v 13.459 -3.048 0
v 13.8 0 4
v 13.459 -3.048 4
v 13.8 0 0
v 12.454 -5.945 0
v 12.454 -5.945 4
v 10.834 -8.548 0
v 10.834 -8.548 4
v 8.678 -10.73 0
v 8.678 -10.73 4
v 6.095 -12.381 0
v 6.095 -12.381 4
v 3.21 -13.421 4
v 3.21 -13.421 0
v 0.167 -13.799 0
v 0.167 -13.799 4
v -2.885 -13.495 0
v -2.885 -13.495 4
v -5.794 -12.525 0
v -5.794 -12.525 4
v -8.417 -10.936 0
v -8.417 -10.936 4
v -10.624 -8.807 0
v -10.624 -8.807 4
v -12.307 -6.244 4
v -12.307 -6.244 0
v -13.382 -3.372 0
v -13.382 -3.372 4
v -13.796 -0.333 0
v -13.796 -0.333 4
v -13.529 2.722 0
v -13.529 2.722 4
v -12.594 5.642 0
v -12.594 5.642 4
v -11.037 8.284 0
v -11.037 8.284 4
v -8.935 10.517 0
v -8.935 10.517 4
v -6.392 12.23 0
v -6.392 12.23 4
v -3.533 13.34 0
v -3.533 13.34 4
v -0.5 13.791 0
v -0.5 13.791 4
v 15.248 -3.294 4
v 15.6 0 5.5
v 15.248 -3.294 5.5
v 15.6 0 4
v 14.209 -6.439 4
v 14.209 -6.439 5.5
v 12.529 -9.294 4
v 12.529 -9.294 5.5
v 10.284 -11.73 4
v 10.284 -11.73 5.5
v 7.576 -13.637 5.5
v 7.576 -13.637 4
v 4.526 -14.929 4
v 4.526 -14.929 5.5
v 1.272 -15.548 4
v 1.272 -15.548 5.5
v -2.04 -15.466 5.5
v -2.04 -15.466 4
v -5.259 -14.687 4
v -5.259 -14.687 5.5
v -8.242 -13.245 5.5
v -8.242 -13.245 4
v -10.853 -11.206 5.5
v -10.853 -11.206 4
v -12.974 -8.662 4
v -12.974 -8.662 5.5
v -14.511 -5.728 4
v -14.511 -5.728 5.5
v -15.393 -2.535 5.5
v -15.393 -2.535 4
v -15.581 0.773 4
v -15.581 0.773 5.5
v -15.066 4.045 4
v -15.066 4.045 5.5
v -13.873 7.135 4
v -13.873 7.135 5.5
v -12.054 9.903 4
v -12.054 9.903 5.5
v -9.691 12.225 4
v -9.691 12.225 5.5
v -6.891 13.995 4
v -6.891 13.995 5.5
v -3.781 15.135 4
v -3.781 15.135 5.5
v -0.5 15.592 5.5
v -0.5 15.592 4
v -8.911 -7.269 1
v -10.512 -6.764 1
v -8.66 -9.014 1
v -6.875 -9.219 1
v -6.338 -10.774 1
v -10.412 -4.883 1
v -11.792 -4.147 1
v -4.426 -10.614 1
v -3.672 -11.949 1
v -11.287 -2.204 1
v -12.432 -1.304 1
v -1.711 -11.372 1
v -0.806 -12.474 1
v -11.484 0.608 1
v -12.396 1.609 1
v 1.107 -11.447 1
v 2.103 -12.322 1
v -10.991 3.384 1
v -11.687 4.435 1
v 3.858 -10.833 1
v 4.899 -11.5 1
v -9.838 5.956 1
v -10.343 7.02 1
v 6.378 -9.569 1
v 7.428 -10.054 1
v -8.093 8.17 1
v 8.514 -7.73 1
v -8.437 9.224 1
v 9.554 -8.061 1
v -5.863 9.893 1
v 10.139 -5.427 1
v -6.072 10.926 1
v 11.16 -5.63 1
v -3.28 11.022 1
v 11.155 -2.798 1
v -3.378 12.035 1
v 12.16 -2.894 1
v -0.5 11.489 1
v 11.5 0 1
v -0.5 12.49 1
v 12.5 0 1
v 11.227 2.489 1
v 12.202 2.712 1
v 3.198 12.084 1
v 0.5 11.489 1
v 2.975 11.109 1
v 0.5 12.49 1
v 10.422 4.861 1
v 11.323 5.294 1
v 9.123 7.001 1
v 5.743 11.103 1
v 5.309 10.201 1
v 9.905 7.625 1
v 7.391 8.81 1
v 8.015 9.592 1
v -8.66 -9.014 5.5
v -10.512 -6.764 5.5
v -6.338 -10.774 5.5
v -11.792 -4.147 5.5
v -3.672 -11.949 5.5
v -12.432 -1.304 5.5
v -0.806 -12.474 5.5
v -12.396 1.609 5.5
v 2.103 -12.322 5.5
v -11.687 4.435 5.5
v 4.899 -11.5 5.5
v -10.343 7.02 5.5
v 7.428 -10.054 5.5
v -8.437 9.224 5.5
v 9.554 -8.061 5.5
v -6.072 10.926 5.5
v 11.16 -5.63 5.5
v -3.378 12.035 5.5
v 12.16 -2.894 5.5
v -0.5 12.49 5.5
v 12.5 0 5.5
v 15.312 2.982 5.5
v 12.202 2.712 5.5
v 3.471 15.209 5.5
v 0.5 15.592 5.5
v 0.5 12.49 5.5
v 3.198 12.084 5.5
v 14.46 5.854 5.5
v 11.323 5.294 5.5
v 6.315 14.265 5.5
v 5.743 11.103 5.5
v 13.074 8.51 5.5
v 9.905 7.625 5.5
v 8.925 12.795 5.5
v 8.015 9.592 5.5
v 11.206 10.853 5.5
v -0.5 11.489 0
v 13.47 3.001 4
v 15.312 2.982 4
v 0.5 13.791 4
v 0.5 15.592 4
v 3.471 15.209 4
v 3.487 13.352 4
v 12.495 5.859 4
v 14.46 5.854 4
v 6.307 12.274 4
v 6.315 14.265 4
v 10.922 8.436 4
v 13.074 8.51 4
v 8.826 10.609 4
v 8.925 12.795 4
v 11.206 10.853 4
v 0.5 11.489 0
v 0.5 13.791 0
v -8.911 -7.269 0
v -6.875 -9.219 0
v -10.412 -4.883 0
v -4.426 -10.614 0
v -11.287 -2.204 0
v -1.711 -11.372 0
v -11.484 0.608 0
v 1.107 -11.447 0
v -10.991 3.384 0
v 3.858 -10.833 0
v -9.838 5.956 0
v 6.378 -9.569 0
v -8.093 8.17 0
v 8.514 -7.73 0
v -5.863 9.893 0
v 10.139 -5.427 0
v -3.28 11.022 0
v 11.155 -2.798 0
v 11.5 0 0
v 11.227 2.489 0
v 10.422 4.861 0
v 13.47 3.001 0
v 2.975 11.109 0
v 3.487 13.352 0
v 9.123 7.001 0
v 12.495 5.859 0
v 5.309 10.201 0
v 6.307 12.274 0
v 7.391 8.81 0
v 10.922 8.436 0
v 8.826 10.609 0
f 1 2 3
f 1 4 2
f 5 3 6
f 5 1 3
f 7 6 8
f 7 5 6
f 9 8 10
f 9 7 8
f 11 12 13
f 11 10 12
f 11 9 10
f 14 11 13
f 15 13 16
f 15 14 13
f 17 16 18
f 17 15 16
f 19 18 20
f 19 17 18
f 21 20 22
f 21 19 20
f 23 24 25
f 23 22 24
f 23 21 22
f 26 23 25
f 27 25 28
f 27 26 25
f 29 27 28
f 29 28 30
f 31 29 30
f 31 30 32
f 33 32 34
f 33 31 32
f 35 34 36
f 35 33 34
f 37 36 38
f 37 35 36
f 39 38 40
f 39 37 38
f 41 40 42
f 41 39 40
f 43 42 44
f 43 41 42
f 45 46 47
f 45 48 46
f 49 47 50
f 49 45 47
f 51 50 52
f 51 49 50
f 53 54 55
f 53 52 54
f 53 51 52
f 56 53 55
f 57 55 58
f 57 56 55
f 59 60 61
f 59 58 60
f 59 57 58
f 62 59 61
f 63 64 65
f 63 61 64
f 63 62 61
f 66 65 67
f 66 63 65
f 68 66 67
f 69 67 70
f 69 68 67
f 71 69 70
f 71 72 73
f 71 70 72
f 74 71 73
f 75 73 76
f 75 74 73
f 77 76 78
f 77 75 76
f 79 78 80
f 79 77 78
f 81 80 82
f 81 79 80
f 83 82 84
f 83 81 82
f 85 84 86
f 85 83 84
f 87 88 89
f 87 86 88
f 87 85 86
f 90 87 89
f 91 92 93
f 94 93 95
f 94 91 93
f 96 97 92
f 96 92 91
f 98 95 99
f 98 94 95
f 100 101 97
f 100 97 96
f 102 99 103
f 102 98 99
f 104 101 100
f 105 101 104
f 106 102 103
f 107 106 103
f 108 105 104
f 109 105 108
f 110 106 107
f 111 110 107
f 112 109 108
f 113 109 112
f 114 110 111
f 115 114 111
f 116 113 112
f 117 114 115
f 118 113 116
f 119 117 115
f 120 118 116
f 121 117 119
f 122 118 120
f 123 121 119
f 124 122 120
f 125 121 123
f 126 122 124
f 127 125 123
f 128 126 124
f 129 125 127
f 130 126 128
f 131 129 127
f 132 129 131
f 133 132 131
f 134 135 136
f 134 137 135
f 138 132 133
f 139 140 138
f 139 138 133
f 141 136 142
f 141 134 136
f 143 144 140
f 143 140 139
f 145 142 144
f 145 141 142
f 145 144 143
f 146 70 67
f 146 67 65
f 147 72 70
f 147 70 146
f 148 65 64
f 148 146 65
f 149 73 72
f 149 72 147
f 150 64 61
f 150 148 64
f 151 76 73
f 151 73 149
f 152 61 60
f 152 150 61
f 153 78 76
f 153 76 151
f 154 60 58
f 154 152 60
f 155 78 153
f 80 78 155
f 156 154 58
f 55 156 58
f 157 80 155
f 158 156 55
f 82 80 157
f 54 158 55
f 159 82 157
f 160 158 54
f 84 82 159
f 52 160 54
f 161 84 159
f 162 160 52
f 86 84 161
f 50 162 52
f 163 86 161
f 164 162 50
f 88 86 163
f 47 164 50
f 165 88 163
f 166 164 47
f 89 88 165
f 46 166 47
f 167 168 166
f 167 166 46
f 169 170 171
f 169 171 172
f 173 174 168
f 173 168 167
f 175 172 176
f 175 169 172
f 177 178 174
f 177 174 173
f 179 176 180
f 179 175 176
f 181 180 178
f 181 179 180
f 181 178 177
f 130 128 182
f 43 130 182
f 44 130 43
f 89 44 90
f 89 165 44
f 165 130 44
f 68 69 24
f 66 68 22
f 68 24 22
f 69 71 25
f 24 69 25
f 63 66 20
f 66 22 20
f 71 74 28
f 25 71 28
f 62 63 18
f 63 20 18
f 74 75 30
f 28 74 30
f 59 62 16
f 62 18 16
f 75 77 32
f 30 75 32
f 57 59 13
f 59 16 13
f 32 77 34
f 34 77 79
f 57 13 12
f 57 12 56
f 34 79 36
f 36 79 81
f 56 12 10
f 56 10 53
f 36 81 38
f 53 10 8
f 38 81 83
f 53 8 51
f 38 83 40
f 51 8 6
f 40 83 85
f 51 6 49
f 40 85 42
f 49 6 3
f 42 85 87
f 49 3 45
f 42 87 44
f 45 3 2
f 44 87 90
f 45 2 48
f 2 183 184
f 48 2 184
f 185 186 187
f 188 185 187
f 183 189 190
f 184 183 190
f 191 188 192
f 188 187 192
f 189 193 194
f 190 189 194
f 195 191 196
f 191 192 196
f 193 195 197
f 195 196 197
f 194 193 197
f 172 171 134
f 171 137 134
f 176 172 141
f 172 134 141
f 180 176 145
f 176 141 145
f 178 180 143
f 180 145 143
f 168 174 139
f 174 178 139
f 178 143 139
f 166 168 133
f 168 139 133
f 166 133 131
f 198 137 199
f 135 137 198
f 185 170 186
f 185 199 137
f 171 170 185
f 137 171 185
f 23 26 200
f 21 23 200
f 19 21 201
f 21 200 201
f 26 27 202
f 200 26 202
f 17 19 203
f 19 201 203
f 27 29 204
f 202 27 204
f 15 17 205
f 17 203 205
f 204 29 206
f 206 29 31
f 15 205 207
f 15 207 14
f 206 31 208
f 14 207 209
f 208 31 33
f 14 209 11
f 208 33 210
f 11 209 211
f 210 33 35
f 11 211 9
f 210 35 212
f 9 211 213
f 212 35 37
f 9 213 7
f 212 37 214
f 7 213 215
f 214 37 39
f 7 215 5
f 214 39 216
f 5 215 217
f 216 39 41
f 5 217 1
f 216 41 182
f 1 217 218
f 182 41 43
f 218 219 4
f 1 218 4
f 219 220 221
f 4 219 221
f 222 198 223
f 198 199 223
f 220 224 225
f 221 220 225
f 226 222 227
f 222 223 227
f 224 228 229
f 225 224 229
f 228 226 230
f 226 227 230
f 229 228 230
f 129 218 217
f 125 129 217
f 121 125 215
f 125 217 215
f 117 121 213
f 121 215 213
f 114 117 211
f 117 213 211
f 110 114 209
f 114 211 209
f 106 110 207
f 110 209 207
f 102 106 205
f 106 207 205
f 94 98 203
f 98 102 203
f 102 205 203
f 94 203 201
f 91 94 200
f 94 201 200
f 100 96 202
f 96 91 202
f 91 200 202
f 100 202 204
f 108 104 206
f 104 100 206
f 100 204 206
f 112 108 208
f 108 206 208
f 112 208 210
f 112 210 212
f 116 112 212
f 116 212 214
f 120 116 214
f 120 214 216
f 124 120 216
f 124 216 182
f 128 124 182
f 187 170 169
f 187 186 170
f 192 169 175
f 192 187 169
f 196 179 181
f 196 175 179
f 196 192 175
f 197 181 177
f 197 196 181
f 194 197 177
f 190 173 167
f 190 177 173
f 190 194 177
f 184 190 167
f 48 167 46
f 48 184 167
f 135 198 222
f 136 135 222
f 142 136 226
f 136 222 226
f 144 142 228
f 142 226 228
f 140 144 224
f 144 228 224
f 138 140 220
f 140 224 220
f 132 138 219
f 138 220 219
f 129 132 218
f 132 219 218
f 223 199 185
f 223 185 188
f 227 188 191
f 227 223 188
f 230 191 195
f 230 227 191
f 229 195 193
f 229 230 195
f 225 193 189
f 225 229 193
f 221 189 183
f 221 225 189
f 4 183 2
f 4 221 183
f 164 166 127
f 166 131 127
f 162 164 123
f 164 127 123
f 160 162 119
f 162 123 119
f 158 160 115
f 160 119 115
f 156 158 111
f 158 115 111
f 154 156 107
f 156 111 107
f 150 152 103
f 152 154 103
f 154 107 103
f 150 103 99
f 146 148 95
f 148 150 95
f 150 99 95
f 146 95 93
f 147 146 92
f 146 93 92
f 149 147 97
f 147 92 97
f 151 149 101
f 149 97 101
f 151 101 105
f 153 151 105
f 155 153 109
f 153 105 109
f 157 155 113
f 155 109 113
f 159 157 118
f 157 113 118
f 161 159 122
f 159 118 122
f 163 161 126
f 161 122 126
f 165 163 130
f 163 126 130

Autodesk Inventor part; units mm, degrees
ref_plane "YZ Plane" through (0, 0, 0) normal (1, 0, 0) x (0, 1, 0)
ref_plane "XZ Plane" through (0, 0, 0) normal (0, 1, 0) x (-1, 0, 0)
ref_plane "XY Plane" through (0, 0, 0) normal (0, 0, 1) x (1, 0, 0)
sketch "Sketch1" plane through (0, 0, 0) normal (0, 0, 1) x (1, 0, 0)
  circle A0 centre (0, 0) radius 13.8
  circle A1 centre (0, 0) radius 11.5
  circle A2 centre (0, 0) radius 15.6
  circle A3 centre (0, 0) radius 12.5
  dimension "d0" = 27.6
  dimension "d1" = 23
  dimension "d2" = 31.2
  dimension "d3" = 25
extrude "Extrusion1" add sketch "Sketch1" along normal blind 1 contours A3
extrude "Extrusion2" add sketch "Sketch1" along normal blind 4 contours A0
sketch "Sketch2" plane through (0, 0, 4) normal (0, 0, 1) x (1, 0, 0)
  circle A0 centre (0, 0) radius 15.6 projected
  circle A1 centre (0, 0) radius 12.5 projected
extrude "Extrusion3" add sketch "Sketch2" along normal blind 1.5
sketch "Sketch3" plane through (0, 0, 5.5) normal (0, 0, 1) x (1, 0, 0)
  line L0 (0.5, 8.5) -> (-0.5, 8.5)
  line L1 (-0.5, 8.5) -> (-0.5, 16.5)
  line L2 (-0.5, 16.5) -> (0.5, 16.5)
  line L3 (0.5, 16.5) -> (0.5, 8.5)
  circle A0 centre (0, 0) radius 12.5 projected
  line L4 (0.5, 8.5) -> (-0.5, 16.5) construction
  line L5 (-0.5, 8.5) -> (0.5, 16.5) construction
  point P0 (0, 12.5)
  dimension "d10" = 1
  dimension "d11" = 8
extrude "Extrusion4" cut sketch "Sketch3" against normal blind 10 contours L0 L1 A0 L3 | A0 L1 L2 L3 picked at (0.0556, 9.833)
properties part number "25mmFilterAdapter"
